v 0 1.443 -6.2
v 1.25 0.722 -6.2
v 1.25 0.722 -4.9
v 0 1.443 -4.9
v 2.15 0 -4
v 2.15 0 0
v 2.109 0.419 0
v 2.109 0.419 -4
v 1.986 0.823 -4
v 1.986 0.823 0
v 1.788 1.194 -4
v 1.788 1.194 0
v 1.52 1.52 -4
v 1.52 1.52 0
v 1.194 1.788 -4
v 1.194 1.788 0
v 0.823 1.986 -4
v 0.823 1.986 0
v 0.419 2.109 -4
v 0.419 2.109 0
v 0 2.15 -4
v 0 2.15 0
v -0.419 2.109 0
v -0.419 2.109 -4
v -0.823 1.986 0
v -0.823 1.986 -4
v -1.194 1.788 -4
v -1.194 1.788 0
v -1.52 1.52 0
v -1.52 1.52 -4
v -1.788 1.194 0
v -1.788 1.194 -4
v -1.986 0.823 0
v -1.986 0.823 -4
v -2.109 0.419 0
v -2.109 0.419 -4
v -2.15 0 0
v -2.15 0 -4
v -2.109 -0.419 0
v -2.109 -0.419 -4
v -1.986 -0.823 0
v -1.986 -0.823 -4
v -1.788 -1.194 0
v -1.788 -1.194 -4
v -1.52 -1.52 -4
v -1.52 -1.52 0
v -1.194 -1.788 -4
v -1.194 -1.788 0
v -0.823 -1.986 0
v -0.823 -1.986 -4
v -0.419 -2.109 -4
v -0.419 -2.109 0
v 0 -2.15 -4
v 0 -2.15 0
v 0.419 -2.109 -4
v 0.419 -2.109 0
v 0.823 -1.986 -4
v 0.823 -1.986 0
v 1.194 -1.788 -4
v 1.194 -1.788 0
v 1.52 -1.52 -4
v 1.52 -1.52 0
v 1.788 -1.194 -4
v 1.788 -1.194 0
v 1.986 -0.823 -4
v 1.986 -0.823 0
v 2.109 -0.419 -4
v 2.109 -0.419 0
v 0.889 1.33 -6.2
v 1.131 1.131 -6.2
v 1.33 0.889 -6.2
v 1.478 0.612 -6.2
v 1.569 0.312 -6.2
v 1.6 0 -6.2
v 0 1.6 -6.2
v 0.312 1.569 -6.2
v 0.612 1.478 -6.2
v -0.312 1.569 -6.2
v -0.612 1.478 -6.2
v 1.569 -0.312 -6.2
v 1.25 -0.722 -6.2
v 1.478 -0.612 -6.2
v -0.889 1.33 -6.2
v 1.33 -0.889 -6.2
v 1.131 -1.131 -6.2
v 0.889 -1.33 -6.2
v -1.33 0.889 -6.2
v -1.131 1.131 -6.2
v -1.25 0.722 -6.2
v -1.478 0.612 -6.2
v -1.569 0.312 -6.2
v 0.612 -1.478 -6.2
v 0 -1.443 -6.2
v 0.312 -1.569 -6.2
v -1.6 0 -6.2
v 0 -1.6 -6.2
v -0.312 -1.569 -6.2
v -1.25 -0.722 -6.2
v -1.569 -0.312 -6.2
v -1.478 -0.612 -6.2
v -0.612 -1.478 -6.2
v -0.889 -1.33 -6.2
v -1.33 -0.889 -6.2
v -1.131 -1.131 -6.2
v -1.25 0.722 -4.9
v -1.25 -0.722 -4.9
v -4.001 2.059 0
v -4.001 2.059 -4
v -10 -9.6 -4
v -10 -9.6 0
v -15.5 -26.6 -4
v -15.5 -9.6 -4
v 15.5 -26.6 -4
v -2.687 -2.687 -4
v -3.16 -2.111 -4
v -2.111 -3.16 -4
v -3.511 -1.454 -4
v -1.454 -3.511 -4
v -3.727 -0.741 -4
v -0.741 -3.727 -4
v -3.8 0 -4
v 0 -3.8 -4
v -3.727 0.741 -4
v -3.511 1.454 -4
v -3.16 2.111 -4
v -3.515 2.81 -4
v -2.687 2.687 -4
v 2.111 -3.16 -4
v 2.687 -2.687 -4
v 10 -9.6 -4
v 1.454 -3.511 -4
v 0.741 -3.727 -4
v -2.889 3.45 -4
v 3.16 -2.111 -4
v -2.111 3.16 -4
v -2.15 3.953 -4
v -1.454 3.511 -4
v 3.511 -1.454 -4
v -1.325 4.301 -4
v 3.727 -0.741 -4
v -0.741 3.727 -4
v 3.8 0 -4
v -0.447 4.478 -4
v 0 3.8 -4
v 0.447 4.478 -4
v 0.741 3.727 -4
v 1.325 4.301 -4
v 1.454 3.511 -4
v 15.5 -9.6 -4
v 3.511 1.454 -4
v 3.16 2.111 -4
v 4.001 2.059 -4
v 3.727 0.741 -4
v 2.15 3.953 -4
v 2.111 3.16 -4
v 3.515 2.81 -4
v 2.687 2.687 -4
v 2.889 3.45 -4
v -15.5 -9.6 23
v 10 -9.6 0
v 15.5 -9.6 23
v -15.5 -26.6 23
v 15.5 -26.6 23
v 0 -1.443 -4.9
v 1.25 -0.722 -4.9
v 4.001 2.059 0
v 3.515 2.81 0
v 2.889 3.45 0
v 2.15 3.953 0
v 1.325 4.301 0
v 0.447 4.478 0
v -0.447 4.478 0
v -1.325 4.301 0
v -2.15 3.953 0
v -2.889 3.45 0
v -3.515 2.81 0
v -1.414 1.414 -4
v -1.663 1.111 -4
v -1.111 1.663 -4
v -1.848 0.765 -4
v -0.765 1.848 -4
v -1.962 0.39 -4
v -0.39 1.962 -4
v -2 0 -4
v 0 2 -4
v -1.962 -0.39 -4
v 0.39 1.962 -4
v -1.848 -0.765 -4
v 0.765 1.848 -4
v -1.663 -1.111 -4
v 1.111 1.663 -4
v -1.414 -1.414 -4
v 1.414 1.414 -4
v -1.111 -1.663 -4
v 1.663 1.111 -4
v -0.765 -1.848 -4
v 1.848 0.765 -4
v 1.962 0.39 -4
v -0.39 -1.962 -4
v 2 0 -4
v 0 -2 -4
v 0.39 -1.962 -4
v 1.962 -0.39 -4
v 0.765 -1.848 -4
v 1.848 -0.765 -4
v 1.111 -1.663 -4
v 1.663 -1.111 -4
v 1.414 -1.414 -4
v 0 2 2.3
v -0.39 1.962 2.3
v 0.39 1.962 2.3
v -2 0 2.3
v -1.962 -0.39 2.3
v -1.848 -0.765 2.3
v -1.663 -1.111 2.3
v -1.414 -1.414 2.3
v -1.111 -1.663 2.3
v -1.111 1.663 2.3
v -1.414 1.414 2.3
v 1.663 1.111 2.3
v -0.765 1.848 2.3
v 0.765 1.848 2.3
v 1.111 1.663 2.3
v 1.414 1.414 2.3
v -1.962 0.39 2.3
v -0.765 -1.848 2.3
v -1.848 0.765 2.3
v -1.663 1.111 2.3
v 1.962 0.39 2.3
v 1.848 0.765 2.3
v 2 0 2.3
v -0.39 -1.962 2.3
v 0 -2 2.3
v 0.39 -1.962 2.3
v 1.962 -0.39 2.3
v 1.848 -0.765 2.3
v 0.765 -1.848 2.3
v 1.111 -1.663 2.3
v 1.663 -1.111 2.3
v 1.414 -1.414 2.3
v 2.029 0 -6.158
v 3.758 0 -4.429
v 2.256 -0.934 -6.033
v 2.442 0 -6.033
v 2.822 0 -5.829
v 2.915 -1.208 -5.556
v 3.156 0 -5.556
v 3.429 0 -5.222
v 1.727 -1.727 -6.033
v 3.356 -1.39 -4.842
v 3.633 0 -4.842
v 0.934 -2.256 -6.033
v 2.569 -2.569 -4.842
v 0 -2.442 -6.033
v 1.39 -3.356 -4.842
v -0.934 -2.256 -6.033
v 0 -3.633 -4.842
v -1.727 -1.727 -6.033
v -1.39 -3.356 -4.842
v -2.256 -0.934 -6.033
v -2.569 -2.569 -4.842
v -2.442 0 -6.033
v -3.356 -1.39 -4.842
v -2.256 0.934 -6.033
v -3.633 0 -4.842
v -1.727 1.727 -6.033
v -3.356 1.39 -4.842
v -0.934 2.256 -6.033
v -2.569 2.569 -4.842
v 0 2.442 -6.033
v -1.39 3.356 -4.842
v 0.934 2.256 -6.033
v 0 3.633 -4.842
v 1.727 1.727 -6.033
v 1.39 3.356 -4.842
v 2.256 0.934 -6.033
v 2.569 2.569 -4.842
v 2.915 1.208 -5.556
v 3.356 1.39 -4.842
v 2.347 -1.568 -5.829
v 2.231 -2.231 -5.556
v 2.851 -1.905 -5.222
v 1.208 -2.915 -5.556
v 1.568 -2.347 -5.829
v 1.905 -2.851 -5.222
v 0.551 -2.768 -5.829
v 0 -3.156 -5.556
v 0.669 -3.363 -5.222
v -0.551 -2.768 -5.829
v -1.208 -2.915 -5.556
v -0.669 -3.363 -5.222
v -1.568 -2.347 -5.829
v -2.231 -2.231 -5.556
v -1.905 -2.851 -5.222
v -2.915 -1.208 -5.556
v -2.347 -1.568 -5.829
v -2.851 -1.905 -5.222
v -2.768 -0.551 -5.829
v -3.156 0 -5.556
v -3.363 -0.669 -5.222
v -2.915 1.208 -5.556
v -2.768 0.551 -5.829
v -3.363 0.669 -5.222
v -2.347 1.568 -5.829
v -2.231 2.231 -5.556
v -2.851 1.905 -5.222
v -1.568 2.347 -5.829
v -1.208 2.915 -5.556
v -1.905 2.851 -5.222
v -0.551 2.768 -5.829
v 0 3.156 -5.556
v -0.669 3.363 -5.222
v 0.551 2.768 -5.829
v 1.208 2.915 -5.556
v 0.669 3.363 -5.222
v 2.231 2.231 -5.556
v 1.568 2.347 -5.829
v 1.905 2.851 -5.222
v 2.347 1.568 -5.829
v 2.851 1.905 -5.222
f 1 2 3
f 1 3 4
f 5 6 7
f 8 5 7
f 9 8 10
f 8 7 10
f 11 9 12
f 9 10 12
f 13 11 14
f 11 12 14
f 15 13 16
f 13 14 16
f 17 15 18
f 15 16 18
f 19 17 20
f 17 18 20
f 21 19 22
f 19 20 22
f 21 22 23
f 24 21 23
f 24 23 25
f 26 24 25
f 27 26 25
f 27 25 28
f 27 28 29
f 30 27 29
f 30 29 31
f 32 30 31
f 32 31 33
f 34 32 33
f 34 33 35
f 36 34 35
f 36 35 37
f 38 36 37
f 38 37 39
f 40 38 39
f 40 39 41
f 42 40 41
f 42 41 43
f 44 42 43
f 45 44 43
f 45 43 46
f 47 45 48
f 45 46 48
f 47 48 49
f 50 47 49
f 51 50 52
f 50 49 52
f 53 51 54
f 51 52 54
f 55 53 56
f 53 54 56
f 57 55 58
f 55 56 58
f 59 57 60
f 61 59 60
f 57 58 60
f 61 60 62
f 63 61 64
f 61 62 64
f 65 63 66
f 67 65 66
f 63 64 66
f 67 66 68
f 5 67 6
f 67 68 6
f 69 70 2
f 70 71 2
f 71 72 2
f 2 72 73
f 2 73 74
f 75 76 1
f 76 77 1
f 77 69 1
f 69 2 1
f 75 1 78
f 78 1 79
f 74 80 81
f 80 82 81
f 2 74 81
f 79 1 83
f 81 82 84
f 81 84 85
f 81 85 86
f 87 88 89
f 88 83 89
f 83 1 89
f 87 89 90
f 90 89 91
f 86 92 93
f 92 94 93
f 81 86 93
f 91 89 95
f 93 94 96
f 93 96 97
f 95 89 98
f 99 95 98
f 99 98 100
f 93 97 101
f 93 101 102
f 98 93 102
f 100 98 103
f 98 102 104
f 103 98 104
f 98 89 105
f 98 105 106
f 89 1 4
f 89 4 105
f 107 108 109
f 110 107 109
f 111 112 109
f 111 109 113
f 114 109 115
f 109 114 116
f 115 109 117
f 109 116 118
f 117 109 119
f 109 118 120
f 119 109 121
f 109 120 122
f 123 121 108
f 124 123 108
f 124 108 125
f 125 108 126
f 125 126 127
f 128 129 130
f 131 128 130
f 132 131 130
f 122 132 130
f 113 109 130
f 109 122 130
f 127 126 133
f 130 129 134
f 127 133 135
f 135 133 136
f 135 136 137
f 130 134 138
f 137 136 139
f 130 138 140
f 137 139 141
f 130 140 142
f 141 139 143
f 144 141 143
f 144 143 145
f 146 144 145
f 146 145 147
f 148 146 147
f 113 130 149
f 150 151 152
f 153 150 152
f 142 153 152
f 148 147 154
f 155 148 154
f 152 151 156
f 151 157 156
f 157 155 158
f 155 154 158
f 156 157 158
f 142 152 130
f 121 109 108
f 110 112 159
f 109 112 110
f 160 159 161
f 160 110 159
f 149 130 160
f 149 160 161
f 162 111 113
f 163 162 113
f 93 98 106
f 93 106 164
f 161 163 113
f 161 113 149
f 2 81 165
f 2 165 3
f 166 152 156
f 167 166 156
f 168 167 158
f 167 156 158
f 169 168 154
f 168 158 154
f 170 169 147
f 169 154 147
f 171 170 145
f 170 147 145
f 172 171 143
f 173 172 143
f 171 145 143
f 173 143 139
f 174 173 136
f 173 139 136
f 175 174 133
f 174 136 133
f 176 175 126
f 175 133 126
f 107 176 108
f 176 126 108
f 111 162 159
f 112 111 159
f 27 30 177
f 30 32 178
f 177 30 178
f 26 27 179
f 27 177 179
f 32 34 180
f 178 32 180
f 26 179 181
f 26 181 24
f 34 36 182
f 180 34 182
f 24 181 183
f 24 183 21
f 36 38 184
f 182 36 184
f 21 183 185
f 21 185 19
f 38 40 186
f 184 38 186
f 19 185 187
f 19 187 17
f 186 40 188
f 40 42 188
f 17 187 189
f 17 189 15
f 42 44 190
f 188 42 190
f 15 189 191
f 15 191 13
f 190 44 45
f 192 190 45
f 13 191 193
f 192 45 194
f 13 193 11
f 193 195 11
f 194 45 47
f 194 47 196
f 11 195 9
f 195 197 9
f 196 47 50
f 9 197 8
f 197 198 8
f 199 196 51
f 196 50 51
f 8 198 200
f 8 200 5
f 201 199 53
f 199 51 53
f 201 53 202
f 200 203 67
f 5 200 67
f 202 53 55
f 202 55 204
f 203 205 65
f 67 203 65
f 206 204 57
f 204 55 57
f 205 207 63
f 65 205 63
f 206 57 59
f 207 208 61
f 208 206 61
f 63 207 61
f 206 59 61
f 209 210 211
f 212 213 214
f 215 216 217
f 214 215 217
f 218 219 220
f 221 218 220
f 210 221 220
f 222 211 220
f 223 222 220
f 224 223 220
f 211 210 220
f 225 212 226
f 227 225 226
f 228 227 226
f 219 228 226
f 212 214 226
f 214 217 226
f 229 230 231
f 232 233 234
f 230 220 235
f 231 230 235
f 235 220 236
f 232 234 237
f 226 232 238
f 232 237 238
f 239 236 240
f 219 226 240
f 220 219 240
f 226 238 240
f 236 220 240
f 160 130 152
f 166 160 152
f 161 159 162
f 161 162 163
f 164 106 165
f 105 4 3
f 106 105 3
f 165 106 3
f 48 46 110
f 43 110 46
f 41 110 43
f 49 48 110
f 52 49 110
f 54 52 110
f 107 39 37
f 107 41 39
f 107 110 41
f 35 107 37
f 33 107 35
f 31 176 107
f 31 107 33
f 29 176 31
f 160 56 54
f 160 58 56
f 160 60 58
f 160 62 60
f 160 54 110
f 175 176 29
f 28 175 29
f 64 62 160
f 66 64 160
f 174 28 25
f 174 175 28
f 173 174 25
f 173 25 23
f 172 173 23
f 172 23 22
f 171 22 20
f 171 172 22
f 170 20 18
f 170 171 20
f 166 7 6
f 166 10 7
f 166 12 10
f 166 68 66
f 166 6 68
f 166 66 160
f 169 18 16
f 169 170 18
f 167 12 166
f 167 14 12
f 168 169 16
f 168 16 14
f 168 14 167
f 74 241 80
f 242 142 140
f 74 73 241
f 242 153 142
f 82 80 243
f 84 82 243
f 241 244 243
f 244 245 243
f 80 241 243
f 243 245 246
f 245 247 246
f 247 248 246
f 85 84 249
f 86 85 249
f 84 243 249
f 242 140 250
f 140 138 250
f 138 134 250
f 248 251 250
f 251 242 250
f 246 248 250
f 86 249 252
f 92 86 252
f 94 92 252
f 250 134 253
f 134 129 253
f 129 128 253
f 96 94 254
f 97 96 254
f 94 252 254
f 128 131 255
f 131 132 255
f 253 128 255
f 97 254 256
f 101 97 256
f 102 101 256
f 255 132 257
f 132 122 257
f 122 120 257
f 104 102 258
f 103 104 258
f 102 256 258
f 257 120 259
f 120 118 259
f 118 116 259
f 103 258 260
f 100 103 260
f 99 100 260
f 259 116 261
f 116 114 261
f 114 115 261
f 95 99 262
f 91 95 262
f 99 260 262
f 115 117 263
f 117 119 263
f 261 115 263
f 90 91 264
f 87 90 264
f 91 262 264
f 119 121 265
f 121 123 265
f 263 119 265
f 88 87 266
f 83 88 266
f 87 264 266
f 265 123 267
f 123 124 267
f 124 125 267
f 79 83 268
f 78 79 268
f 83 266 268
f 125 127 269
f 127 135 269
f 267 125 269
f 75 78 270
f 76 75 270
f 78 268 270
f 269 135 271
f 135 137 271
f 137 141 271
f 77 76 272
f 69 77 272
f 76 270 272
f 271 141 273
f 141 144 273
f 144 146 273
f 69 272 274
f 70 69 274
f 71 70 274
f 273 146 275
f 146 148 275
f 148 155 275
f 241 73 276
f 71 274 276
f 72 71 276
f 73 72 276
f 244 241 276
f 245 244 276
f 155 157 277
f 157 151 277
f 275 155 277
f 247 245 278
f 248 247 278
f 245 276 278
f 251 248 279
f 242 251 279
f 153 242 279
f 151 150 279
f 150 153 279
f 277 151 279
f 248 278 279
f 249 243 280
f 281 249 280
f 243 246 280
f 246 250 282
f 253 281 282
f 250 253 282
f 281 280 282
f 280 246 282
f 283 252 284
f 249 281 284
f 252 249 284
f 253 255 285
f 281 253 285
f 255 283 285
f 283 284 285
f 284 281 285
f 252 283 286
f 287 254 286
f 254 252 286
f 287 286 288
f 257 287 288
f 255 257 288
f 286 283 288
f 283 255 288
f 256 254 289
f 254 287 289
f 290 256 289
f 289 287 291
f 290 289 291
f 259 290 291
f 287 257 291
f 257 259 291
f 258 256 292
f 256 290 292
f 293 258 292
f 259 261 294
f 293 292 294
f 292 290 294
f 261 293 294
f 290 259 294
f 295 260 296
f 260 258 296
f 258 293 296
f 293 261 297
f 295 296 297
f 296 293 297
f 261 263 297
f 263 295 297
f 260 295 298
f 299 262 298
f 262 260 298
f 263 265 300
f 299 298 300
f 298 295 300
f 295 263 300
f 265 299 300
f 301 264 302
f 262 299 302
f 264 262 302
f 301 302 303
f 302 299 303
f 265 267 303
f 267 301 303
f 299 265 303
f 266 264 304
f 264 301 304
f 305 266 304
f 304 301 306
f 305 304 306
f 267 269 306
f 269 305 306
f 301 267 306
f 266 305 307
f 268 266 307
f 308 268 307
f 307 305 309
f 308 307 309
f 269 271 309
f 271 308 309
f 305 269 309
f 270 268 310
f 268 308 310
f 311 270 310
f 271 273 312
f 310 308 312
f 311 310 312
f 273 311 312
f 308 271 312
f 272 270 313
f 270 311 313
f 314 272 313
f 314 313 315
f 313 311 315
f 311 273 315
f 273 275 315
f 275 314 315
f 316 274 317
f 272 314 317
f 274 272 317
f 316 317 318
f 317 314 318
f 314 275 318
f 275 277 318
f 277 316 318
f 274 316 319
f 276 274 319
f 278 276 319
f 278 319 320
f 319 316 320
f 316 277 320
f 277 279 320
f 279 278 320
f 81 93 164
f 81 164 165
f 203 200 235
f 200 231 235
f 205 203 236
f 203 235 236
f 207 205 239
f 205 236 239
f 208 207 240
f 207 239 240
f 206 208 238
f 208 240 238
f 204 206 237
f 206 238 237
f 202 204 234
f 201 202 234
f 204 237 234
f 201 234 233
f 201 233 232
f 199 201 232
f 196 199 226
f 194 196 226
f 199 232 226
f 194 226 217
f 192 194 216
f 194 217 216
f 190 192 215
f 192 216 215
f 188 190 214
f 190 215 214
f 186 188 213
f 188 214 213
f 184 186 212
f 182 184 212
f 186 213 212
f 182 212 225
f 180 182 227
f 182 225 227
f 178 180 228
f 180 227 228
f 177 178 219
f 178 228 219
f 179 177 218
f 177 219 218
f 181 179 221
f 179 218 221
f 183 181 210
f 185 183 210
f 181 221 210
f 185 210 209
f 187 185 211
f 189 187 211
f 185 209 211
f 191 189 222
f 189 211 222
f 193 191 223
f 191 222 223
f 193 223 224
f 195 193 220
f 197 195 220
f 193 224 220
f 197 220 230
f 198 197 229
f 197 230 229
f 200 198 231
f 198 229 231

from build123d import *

# Parameters (mm, degrees)
BOSS_EXTRUDE1_DEPTH = 4
SKETCH2_W           = 31
SKETCH2_H           = 17
BOSS_EXTRUDE2_DEPTH = 27
SKETCH4_R           = 2.15
CUT_EXTRUDE1_DEPTH  = 39.429285708
CUT_EXTRUDE2_DEPTH  = 1.3


with BuildPart() as part:
    # Sketch1 → Boss-Extrude1 (new body)
    with BuildSketch(Plane.XY.offset(-4)):
        with BuildLine():
            Line((-10, -9.6), (10, -9.6))
            Line((10, -9.6), (4.001428187, 2.058779362))
            ThreePointArc((4.001428187, 2.058779362), (0, 4.5), (-4.001428187, 2.058779362))
            Line((-4.001428187, 2.058779362), (-10, -9.6))
        make_face()
    extrude(amount=BOSS_EXTRUDE1_DEPTH)

    # Sketch2 → Boss-Extrude2 (add)
    with BuildSketch(Plane.XY.offset(-4)):
        with Locations((0, -18.1)):
            Rectangle(SKETCH2_W, SKETCH2_H)
    extrude(amount=BOSS_EXTRUDE2_DEPTH)

    # Sketch4 → Cut-Extrude1 (cut, through all)
    with BuildSketch(Plane.XY):
        Circle(SKETCH4_R)
    extrude(amount=-CUT_EXTRUDE1_DEPTH, mode=Mode.SUBTRACT)

    # Sketch5 → Revolve1 (revolve)
    with BuildSketch(Plane(origin=(0, 0, 0), x_dir=(0, 0, -1), z_dir=(1, 0, 0))):
        with BuildLine():
            Line((-2.3, 0), (6.2, 0))
            Line((6.2, 0), (6.2, 1.6))
            ThreePointArc((6.2, 1.6), (5.555634919, 3.155634919), (4, 3.8))
            Line((4, 3.8), (4, 2))
            Line((4, 2), (-2.3, 2))
            Line((-2.3, 2), (-2.3, 0))
        make_face()
    revolve(axis=Axis((0, 0, 2.3), (0, 0, -1)))

    # Sketch6 → Cut-Extrude2 (cut)
    with BuildSketch(Plane.XY.offset(-6.2)):
        Polygon((0, 1.443375673), (-1.25, 0.721687836), (-1.25, -0.721687836), (0, -1.443375673), (1.25, -0.721687836), (1.25, 0.721687836), align=None)
    extrude(amount=CUT_EXTRUDE2_DEPTH, mode=Mode.SUBTRACT)


solid = part.part
